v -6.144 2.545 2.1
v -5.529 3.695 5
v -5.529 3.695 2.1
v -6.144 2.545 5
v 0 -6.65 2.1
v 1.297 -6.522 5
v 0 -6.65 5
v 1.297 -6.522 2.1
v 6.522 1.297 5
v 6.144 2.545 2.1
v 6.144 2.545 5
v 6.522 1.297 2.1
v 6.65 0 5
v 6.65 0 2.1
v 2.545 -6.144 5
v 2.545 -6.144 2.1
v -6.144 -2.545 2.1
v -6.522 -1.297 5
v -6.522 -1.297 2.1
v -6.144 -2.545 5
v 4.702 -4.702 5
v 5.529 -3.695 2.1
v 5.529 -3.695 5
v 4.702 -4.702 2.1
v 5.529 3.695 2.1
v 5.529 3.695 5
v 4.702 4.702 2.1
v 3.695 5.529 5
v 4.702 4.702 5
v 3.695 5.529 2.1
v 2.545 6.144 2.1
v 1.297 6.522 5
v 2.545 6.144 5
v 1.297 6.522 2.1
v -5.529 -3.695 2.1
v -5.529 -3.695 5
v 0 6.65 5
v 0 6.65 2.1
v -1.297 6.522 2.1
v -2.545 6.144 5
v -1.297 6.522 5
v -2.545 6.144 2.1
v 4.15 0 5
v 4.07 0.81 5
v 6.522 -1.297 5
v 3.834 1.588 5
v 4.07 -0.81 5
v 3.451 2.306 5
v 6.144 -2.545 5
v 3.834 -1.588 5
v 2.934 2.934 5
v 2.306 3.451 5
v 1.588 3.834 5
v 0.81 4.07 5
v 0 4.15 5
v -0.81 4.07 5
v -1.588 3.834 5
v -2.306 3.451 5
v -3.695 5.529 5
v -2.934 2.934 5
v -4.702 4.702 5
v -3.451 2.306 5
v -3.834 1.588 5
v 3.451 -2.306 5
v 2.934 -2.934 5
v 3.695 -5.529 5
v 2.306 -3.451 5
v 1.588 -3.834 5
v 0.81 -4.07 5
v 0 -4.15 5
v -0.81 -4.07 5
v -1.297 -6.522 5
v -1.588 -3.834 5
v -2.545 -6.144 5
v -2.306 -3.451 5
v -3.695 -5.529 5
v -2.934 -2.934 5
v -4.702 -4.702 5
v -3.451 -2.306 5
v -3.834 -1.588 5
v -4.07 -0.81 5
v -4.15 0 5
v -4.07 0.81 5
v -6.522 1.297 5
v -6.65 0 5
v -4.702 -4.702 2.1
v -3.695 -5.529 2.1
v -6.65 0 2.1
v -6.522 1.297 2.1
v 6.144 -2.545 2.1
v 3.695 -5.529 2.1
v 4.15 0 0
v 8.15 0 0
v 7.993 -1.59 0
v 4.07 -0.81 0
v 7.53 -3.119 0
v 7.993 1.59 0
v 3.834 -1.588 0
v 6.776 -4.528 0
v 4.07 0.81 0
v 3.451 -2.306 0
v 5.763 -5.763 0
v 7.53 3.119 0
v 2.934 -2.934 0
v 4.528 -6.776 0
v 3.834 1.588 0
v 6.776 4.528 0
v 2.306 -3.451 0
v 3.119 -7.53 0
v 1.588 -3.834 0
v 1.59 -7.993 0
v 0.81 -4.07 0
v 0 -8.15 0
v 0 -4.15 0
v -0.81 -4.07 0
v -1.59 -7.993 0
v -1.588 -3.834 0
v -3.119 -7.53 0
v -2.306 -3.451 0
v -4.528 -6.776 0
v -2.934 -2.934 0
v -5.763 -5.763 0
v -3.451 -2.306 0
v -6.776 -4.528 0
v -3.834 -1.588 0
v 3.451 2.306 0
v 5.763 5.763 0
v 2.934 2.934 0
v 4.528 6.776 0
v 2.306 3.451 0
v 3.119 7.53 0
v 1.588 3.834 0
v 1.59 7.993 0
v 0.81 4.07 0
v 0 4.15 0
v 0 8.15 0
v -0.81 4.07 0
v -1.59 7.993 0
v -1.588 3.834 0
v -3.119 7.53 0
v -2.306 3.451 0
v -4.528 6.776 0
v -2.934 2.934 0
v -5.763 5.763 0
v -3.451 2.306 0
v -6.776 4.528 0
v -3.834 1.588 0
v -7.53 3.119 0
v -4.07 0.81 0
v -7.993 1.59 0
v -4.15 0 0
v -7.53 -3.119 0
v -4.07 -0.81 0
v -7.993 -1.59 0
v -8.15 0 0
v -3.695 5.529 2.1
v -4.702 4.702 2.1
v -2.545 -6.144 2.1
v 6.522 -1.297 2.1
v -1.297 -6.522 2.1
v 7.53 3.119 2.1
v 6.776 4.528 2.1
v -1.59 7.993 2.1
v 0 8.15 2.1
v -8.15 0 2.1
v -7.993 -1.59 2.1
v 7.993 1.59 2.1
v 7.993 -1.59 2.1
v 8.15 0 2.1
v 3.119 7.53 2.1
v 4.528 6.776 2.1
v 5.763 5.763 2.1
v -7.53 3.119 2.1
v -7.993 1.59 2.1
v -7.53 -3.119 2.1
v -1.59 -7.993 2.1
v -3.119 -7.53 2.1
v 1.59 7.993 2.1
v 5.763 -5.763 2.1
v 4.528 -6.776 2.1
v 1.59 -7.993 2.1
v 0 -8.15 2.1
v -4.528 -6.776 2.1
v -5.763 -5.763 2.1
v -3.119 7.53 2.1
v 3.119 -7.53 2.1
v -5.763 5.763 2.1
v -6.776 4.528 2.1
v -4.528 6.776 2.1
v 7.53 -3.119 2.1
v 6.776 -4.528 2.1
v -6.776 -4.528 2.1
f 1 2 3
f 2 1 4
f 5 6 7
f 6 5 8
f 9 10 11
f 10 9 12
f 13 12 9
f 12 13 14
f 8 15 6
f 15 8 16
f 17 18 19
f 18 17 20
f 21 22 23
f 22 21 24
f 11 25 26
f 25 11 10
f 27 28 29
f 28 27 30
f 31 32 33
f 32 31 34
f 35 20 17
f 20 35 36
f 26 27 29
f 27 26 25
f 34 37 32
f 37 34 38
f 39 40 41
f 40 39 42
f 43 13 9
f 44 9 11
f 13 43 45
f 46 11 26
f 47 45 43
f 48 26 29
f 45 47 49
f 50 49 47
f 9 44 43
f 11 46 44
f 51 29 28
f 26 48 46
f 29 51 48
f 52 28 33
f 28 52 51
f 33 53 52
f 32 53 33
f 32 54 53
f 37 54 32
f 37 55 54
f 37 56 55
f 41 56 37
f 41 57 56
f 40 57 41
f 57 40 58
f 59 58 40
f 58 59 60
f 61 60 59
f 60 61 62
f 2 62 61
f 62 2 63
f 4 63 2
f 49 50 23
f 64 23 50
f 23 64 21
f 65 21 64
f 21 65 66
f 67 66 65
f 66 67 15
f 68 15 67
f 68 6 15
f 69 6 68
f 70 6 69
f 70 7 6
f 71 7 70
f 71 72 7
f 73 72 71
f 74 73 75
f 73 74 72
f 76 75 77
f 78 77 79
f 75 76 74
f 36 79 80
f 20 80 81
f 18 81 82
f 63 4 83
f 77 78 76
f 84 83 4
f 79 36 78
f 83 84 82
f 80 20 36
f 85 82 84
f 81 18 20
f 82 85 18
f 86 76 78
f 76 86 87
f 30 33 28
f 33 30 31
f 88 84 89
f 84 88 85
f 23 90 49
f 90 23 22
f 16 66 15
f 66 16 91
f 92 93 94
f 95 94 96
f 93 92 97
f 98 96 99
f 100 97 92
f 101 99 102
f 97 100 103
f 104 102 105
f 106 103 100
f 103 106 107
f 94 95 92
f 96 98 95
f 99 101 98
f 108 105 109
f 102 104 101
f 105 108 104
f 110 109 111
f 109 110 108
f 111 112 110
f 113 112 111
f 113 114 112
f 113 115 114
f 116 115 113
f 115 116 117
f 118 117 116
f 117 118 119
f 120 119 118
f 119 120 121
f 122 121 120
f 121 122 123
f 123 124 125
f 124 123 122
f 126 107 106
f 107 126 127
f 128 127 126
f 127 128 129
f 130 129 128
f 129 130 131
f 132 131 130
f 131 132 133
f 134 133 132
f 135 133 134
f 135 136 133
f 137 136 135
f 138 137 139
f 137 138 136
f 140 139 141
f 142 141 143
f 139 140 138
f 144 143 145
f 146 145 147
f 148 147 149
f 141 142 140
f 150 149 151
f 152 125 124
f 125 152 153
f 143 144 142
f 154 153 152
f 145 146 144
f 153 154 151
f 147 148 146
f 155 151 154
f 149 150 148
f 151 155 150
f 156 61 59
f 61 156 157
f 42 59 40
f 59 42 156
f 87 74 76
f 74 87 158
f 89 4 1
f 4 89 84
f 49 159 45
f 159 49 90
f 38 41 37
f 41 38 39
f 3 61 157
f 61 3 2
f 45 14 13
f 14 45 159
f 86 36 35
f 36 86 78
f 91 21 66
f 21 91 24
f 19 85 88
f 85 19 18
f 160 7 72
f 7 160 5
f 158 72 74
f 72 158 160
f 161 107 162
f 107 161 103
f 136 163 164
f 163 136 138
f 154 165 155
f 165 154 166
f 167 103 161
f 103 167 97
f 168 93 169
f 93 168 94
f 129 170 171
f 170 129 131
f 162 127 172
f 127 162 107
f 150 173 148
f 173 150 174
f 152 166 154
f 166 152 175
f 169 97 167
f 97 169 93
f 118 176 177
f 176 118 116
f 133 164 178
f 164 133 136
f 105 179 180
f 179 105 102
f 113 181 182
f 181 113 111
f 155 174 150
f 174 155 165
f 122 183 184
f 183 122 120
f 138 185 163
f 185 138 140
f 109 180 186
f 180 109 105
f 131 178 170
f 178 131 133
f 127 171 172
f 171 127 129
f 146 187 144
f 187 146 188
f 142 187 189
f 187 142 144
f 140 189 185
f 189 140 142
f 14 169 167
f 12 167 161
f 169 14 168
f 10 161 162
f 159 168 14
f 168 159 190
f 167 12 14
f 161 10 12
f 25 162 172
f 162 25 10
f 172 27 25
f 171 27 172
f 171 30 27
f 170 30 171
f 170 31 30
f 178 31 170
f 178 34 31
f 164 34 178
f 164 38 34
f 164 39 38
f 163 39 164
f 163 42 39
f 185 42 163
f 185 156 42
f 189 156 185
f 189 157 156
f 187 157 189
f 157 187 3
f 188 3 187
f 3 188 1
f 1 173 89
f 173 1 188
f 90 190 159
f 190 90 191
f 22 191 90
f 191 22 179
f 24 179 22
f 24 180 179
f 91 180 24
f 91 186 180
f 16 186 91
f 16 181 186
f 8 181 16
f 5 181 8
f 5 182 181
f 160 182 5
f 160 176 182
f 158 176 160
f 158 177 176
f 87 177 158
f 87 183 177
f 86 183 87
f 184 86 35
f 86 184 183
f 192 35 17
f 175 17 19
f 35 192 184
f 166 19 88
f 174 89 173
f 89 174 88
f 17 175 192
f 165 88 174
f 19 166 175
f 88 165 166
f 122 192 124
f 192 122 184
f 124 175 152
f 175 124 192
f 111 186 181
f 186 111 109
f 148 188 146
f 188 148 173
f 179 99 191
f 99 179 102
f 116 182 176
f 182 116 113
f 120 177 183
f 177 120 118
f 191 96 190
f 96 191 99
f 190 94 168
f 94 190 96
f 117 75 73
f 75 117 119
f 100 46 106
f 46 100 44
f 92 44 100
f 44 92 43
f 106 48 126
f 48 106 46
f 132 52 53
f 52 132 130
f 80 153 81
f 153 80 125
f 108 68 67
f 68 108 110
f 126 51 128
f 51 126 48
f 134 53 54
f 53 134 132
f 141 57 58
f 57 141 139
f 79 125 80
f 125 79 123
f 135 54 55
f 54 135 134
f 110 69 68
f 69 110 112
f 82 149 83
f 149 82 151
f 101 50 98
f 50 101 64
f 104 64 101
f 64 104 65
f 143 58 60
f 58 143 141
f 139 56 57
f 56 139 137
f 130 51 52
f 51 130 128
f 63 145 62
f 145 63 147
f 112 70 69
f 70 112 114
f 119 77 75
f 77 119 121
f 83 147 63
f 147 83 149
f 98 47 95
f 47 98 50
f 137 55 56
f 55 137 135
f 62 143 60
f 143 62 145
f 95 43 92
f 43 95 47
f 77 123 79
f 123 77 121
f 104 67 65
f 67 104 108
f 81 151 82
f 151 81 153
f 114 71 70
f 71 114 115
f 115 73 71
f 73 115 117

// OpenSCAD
$fn = 32;

// ----------------------------------------------------------------------
// Spacer sleeve: 13.3 / 8.3 x 5 mm
// ----------------------------------------------------------------------

// --- parameters (mm) ---
sleeve_od = 13.3;         // outside diameter
sleeve_id = 8.3;          // shaft bore
sleeve_l = 5;             // sleeve length
flange_d = 16.3;          // collar diameter
flange_t = 1.5;           // collar thickness

module sleeve() {
  cylinder(h = sleeve_l, d = sleeve_od);
  cylinder(h = flange_t + 0.6, d = flange_d);
}

difference() {
  sleeve();
  translate([0, 0, -1]) cylinder(h = sleeve_l + 2, d = sleeve_id);
}
